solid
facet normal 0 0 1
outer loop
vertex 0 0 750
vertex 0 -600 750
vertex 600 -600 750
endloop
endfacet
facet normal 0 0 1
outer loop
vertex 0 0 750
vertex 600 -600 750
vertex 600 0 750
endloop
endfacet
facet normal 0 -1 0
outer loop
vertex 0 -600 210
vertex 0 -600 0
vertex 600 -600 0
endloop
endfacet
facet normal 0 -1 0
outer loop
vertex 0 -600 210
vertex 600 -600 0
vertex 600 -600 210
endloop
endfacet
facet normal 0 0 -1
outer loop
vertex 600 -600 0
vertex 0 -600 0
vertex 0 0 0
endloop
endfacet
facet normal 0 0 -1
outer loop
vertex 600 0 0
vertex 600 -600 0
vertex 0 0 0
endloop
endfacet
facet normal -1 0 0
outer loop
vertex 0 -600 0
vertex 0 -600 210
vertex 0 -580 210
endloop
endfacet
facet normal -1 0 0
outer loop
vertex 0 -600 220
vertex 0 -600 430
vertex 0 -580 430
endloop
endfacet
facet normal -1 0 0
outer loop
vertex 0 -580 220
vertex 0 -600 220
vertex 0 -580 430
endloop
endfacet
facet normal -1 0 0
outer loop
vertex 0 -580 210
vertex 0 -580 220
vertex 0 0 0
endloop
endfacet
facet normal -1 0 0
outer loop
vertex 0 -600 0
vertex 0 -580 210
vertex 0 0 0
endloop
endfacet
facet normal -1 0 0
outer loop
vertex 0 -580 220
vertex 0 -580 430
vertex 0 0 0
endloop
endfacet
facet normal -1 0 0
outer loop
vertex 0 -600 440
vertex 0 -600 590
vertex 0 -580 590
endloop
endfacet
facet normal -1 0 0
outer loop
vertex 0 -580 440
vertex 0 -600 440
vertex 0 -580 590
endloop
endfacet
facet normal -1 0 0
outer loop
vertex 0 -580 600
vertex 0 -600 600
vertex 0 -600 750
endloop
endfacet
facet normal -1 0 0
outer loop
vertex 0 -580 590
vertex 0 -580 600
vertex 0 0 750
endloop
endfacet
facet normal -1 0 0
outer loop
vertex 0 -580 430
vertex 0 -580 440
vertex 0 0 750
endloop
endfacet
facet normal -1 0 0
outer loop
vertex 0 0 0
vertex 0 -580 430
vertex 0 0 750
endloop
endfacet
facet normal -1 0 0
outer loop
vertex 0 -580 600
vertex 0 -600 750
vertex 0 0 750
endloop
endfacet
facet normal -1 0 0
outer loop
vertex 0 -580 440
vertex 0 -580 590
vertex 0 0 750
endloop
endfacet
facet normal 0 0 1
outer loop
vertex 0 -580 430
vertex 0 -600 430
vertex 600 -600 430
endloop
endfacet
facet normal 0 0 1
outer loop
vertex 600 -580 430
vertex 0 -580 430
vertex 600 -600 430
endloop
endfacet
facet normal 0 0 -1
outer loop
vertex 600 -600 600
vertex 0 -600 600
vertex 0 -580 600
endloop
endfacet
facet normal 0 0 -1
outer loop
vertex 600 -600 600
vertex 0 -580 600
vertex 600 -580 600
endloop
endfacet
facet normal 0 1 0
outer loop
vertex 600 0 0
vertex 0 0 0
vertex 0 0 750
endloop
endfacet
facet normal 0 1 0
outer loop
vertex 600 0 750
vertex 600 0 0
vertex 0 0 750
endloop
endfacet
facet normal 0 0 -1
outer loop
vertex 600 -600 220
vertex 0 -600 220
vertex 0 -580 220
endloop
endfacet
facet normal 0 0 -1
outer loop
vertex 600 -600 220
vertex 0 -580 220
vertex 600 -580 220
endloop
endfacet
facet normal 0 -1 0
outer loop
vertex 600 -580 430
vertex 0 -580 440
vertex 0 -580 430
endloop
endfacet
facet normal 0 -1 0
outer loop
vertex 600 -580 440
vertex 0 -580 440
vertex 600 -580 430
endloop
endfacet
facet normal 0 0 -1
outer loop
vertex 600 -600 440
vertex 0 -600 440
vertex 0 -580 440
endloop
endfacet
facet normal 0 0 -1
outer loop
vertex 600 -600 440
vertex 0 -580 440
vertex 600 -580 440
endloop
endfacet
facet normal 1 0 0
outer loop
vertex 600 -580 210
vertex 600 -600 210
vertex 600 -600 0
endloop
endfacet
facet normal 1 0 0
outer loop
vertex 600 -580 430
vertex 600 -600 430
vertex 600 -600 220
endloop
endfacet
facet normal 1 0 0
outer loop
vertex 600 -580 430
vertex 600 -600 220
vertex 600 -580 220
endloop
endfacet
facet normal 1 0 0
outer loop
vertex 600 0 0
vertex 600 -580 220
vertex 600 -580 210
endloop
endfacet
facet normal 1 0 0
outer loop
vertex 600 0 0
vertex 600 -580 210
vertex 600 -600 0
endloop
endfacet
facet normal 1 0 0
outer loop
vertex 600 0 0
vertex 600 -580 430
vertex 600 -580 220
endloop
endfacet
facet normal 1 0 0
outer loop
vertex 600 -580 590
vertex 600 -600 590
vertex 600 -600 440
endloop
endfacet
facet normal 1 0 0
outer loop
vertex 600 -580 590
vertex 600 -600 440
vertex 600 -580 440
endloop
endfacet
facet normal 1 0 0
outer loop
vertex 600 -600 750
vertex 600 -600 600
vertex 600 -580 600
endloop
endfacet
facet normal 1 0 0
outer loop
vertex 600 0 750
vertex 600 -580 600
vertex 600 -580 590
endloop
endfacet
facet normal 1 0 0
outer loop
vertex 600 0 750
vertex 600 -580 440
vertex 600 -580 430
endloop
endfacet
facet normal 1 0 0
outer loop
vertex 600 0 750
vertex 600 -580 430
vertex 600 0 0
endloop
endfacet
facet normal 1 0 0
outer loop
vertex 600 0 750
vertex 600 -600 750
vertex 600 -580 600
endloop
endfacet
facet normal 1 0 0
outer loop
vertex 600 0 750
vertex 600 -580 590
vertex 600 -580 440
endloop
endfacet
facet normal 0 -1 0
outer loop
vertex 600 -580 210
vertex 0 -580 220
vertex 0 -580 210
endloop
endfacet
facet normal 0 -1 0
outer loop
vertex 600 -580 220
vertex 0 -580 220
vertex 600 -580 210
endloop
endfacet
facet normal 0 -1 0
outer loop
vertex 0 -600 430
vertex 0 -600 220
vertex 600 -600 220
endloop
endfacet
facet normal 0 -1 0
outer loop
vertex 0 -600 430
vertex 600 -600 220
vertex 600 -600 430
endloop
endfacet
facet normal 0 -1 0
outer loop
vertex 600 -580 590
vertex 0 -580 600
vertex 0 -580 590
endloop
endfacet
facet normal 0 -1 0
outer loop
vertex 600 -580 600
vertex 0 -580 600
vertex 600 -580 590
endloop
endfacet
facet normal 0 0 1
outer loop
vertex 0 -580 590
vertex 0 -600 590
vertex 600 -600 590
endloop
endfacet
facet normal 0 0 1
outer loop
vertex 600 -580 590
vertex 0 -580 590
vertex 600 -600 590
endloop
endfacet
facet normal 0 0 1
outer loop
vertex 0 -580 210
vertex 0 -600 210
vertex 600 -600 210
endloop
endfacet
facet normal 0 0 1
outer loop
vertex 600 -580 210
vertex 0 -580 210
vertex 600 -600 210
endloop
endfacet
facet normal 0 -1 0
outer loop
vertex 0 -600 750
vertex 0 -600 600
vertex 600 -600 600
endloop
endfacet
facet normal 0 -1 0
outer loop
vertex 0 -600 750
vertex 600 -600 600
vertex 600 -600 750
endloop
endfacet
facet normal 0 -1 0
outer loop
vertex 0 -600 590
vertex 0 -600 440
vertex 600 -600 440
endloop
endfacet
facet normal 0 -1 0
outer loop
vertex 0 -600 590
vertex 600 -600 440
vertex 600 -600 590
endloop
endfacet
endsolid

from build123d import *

# Parameters (mm, degrees)
F0_W     = 600
F0_H     = 750
F1_DEPTH = 600
F2_W     = 600
F2_H     = 10
F3_DEPTH = 20


with BuildPart() as f1:
    # F0 (on Right) → F1 (new body)
    with BuildSketch(Plane.YZ):
        with Locations((-300, 375)):
            Rectangle(F0_W, F0_H)
    extrude(amount=F1_DEPTH)

    # F2 (on face) → F3 (cut)
    with BuildSketch(Plane.XZ.offset(600)):
        with Locations((300, 595)):
            Rectangle(F2_W, F2_H)
        with Locations((300, 435)):
            Rectangle(F2_W, F2_H)
        with Locations((300, 215)):
            Rectangle(F2_W, F2_H)
    extrude(amount=-F3_DEPTH, mode=Mode.SUBTRACT)


solid = f1.part
